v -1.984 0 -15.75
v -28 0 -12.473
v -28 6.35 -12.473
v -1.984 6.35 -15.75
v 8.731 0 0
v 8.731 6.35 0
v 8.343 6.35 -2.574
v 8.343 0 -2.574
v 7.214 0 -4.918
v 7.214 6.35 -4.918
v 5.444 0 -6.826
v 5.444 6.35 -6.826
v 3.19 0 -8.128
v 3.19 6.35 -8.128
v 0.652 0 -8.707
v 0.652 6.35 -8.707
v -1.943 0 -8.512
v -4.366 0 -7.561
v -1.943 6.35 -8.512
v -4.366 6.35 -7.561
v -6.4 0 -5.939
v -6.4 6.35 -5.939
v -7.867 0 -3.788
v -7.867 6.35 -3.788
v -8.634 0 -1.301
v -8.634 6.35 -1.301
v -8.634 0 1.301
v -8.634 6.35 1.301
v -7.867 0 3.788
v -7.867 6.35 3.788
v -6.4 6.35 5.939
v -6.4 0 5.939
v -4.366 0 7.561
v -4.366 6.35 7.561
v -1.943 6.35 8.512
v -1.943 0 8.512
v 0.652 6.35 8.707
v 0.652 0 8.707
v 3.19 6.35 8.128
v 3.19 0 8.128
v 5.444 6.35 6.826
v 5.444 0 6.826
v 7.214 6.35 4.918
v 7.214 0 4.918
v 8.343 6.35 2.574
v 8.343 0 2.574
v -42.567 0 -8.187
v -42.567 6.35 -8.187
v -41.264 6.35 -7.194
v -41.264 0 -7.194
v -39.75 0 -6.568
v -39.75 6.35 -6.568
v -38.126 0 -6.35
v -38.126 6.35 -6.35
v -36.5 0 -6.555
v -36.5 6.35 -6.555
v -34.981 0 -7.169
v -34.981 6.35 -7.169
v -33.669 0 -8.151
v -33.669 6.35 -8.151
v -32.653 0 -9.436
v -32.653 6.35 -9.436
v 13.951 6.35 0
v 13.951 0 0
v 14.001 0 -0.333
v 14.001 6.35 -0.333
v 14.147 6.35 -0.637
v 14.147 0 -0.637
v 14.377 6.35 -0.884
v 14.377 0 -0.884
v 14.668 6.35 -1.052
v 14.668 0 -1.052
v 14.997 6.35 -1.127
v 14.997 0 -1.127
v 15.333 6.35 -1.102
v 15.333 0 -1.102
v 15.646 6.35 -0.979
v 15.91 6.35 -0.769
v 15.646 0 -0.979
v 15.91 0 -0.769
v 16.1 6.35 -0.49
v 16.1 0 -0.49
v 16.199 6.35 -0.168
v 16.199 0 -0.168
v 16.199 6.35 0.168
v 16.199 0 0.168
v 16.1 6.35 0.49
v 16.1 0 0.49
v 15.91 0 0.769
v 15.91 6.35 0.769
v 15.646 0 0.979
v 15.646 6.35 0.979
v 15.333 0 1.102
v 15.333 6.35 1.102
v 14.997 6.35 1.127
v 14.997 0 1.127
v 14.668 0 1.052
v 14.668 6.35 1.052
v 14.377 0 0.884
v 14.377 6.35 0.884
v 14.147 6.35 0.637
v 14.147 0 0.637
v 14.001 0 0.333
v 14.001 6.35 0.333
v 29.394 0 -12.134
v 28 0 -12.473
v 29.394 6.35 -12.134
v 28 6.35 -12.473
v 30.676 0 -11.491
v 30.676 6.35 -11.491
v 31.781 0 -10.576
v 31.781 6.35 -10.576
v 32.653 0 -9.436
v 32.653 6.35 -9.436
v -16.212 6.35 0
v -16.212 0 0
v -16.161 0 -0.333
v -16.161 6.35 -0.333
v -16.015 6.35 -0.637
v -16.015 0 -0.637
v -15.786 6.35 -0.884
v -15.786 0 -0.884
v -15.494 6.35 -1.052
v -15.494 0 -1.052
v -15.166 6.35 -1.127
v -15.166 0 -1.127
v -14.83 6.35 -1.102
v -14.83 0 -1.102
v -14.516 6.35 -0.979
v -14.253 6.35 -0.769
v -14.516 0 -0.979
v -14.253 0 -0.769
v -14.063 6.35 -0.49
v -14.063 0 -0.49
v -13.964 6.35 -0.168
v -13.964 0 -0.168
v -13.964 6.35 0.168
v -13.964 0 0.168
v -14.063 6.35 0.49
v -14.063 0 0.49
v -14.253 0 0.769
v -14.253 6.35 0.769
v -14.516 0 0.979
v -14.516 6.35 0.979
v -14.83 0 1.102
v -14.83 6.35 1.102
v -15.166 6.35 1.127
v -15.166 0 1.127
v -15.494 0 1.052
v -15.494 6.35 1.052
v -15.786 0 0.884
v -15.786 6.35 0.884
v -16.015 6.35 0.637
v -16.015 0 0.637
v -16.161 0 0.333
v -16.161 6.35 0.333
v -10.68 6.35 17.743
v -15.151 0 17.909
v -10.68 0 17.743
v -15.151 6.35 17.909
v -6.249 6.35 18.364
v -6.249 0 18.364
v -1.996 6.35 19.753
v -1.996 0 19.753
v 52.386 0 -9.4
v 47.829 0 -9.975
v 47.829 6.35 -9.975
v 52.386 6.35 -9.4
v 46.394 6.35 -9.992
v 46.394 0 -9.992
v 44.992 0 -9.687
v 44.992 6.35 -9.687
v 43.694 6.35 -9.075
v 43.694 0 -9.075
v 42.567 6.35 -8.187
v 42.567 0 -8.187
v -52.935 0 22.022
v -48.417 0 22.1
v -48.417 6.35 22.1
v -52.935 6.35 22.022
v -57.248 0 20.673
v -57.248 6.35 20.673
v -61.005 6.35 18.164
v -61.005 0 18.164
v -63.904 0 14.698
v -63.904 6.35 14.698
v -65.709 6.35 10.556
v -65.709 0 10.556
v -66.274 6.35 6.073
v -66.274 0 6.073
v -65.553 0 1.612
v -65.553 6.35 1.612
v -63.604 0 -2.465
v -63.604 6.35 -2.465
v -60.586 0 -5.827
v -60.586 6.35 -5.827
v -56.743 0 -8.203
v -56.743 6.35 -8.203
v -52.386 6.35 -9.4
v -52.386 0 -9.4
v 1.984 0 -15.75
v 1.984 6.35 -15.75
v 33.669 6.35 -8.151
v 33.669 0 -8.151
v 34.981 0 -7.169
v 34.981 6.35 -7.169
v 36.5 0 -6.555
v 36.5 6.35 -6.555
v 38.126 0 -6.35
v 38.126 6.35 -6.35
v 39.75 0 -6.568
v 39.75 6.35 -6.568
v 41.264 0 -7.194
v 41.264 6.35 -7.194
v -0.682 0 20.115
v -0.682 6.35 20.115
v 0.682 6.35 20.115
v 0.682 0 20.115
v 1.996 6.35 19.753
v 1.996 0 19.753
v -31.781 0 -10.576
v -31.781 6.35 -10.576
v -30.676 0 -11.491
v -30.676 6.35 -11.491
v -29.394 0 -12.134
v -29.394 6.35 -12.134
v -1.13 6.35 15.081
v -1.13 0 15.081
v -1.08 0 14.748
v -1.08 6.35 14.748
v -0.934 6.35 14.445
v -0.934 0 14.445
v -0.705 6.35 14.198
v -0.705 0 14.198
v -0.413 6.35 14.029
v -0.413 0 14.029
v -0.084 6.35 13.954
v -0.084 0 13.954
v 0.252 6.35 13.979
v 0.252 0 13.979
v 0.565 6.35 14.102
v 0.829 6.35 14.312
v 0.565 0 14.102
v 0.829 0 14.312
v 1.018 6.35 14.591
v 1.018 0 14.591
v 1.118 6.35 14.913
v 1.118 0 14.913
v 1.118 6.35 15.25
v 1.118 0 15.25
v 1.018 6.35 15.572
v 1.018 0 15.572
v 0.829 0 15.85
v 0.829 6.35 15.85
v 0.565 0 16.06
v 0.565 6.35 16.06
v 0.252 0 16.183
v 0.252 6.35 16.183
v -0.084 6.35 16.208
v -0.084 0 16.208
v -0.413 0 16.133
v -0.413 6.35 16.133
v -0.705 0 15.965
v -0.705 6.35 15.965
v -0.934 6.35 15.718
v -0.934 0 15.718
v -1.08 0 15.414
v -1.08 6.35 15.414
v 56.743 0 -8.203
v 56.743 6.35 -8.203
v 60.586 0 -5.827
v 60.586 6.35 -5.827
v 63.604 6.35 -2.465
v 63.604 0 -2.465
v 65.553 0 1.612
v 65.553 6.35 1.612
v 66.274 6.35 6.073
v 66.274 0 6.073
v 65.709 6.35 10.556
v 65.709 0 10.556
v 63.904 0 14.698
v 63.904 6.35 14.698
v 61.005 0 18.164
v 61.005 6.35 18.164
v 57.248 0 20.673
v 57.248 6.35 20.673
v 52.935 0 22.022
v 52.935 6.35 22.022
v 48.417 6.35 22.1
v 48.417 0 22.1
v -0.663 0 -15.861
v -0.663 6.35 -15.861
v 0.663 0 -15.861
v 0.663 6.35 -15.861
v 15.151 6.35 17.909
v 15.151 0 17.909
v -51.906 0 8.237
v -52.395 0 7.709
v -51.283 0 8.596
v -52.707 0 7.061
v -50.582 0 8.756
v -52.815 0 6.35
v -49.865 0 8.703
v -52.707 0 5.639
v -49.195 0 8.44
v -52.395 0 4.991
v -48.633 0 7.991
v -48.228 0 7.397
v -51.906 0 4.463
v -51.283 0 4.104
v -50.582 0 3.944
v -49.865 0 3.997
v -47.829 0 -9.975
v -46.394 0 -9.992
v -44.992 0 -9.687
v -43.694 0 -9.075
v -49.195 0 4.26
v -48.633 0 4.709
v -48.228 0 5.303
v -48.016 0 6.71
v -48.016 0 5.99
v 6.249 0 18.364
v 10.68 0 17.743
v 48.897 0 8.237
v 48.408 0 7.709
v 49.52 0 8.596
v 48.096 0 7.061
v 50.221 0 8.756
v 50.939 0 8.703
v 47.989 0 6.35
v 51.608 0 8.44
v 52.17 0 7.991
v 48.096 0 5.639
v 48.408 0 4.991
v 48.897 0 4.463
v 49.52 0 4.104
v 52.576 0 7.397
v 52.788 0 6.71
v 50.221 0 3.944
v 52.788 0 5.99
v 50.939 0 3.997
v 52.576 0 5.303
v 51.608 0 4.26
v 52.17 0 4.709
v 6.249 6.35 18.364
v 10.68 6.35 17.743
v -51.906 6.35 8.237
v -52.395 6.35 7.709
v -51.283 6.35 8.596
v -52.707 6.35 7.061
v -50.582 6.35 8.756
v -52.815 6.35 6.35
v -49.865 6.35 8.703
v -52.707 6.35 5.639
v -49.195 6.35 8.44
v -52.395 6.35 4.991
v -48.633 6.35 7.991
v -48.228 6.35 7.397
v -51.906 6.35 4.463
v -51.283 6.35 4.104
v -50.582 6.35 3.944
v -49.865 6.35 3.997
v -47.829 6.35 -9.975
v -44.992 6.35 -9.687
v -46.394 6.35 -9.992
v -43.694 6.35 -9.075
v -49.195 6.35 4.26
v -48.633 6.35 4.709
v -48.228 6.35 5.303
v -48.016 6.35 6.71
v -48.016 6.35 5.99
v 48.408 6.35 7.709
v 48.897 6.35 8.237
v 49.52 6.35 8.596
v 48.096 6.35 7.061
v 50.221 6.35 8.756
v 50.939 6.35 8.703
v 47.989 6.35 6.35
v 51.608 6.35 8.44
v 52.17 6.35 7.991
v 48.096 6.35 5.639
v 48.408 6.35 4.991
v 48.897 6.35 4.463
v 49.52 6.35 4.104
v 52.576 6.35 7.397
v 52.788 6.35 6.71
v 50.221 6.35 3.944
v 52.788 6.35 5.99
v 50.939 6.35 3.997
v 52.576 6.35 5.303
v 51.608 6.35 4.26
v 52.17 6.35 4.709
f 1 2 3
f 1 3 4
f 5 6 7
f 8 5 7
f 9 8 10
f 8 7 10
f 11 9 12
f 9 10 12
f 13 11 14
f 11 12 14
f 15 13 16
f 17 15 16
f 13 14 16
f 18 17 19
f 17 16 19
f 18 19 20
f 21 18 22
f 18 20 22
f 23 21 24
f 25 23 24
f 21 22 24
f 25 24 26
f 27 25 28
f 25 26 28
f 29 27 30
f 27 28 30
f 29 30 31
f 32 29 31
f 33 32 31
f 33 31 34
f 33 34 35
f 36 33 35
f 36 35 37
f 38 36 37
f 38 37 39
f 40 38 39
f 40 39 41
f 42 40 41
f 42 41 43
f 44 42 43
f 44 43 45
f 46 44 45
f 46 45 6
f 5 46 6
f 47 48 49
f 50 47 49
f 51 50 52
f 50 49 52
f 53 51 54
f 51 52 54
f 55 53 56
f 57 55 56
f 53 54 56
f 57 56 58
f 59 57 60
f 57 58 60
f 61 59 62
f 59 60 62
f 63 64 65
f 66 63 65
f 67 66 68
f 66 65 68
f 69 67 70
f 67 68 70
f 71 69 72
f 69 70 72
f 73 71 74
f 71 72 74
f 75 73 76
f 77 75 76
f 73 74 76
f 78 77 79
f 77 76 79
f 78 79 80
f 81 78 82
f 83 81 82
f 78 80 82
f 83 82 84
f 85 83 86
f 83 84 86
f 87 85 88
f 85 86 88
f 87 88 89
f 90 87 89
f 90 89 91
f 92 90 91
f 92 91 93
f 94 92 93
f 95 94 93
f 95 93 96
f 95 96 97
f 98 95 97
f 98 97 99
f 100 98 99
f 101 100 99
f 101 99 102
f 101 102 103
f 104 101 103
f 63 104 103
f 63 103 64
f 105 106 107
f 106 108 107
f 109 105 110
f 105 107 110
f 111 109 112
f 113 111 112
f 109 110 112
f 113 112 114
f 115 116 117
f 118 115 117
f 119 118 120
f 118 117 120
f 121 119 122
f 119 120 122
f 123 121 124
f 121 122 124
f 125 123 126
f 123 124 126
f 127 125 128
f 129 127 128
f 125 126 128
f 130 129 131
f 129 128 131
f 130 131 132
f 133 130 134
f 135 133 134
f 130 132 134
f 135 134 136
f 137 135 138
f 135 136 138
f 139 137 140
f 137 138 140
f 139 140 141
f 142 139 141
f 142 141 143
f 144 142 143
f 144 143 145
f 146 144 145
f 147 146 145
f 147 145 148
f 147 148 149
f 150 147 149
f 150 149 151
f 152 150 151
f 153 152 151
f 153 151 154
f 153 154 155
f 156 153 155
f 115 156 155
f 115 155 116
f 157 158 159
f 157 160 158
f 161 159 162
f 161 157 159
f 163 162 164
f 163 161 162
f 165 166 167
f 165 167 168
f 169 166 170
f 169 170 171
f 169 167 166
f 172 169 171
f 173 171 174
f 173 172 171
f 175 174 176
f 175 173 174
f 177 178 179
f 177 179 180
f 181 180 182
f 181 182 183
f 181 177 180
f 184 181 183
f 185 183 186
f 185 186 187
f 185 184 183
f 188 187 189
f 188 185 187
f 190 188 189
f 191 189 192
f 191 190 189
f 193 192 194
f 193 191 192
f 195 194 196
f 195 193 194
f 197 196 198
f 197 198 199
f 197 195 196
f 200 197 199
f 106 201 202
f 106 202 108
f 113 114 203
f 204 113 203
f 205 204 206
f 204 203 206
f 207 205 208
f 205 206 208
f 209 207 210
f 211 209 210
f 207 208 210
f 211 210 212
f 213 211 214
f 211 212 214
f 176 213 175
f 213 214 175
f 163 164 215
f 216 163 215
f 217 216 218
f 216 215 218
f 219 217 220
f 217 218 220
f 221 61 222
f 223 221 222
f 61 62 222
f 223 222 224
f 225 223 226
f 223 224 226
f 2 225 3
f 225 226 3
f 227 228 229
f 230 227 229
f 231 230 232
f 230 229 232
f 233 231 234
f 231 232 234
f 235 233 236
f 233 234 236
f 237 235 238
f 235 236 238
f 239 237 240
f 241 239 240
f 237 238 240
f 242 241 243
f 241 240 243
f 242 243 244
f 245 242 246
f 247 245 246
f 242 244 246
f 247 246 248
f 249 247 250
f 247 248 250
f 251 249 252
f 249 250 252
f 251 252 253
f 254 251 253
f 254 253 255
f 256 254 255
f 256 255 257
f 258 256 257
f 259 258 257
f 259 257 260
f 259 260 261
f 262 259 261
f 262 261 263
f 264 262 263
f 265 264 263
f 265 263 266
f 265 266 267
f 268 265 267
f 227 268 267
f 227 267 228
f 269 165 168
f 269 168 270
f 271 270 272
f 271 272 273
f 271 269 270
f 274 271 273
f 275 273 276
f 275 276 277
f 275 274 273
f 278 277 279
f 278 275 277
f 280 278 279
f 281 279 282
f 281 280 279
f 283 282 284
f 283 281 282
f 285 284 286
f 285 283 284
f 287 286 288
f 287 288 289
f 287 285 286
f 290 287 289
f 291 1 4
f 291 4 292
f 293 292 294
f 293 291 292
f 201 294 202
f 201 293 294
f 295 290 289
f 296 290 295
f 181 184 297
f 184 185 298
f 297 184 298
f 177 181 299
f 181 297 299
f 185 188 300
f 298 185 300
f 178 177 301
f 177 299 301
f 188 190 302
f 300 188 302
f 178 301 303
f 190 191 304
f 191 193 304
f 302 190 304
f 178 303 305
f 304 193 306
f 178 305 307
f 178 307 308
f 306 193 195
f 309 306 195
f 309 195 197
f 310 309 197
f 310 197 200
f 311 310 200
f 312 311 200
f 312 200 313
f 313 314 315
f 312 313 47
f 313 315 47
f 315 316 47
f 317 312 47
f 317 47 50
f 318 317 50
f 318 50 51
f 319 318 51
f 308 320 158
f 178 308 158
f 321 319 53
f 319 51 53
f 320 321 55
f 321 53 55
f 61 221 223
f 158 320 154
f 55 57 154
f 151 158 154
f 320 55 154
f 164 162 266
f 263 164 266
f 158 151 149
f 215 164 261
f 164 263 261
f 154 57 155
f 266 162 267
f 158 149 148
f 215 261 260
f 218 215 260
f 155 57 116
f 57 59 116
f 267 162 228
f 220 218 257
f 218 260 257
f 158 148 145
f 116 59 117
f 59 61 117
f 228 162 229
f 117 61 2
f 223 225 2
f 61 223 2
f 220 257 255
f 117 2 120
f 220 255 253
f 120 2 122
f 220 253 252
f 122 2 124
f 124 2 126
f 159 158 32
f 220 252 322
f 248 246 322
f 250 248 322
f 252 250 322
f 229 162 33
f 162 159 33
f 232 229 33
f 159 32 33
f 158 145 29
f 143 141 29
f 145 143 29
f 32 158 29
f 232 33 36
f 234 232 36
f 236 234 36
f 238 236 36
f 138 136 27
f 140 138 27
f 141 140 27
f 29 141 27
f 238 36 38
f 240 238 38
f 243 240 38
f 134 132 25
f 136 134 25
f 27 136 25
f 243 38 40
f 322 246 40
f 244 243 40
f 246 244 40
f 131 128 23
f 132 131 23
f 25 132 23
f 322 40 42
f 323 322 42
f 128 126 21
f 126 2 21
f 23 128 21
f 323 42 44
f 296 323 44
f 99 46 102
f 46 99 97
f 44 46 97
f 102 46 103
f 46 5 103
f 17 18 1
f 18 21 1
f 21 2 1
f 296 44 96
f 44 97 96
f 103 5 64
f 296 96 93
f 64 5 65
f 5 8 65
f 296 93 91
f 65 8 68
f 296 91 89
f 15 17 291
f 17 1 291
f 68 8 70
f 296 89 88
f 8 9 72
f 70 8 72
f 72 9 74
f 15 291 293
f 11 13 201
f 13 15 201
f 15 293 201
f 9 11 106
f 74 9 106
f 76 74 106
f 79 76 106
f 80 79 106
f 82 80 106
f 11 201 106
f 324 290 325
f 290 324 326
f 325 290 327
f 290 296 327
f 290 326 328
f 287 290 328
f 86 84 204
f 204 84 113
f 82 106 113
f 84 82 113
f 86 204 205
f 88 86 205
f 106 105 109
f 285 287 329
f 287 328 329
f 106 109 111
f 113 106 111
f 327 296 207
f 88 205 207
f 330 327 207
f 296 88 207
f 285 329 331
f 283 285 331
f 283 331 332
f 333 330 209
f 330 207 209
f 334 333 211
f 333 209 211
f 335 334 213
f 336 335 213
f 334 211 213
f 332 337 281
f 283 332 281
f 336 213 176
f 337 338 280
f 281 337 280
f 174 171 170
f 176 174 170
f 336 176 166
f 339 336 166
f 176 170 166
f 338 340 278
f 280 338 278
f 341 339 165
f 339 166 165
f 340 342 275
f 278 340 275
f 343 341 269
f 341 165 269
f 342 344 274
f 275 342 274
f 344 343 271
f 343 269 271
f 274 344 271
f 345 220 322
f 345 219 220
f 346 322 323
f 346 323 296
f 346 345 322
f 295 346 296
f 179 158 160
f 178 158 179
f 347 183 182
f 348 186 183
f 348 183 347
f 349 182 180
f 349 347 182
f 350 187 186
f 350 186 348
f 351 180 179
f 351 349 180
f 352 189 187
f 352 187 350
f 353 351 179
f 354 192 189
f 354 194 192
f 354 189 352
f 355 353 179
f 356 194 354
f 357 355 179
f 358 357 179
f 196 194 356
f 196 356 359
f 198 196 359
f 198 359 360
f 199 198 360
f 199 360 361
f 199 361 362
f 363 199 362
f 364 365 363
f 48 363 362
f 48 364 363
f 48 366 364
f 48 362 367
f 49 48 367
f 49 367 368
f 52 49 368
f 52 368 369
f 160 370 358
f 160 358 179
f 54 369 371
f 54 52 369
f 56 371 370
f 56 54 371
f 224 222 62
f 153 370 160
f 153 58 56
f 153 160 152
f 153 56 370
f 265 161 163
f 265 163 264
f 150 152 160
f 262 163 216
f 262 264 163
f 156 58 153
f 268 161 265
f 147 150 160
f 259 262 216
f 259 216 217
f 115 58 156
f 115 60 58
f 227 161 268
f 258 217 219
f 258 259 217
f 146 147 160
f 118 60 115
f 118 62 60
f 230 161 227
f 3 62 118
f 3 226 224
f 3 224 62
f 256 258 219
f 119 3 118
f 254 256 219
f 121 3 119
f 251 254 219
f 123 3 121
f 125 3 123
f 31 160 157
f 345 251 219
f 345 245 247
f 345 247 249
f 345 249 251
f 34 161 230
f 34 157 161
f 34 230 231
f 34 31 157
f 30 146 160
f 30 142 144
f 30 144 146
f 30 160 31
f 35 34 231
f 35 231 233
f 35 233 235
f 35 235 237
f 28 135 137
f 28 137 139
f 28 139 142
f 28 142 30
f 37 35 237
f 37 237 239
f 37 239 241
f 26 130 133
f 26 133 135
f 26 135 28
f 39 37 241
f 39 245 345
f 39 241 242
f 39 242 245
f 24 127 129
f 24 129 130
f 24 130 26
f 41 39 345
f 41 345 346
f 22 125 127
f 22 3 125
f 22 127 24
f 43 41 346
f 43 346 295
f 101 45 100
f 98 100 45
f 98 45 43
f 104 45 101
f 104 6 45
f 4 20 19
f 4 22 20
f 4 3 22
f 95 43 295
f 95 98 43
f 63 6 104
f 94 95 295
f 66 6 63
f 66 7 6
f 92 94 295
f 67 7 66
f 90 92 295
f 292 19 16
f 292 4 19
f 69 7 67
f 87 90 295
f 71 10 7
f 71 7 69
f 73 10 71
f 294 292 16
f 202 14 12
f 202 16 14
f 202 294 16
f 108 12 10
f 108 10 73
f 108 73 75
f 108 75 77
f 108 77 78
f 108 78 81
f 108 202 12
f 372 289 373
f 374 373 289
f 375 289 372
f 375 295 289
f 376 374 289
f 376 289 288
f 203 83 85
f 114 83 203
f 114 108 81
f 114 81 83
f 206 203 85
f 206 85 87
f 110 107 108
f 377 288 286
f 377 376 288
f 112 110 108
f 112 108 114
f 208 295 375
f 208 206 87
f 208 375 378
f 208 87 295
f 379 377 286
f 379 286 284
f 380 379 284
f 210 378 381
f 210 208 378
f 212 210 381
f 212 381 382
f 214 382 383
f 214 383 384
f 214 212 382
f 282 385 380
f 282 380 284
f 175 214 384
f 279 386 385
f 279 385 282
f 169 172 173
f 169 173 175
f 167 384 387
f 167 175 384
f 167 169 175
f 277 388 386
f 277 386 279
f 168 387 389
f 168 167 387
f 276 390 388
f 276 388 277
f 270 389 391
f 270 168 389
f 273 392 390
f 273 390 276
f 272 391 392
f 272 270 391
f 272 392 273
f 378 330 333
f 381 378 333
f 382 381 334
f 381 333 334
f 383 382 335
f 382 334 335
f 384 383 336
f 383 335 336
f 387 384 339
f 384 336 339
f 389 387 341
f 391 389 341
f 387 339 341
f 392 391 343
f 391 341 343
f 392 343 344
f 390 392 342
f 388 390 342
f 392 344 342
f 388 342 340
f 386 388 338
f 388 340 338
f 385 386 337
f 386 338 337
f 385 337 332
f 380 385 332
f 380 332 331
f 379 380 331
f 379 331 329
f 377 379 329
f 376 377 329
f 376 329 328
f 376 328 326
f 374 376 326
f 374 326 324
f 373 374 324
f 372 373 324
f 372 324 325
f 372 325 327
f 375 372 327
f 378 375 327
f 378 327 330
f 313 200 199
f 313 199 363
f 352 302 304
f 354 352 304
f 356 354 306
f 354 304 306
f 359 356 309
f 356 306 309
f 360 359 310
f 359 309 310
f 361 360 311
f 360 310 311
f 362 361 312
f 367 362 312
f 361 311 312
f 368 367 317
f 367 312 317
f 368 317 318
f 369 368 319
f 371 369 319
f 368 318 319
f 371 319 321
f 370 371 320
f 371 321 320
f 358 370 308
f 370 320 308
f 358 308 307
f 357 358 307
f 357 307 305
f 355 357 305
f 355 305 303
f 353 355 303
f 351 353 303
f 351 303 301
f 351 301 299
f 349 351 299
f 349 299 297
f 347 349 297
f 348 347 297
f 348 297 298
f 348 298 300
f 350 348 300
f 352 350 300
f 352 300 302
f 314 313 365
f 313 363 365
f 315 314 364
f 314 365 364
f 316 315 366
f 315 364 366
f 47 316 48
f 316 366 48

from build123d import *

# Parameters (mm, degrees)
SKETCH1_R              = 5.08
BOSS_EXTRUDE1_DEPTH    = 6.35
F_10_32_TAPPED_HOLE1_D = 4.826
SKETCH7_R              = 8.73125
CUT_EXTRUDE1_DEPTH     = 7.35
SKETCH8_R              = 6.35
CUT_EXTRUDE2_DEPTH     = 7.35
FILLET1_R              = 25.4
FILLET2_R              = 6.35
F_4_40_TAPPED_HOLE1_D  = 2.2606


with BuildPart() as part:
    # Sketch1 → Boss-Extrude1 (new body)
    with BuildSketch(Plane(origin=(0, 0, 0), x_dir=(1, 0, 0), z_dir=(0, 1, 0))):
        with Locations((0, -15.08125)):
            Circle(SKETCH1_R)
        with BuildLine():
            Line((1.984375, -15.750488274), (-48.417187476, -22.100488274))
            ThreePointArc((-48.417187476, -22.100488274), (-66.152050749, -8.334375), (-52.385937476, 9.400488274))
            Line((-52.385937476, 9.400488274), (-1.984375, 15.750488274))
            ThreePointArc((-1.984375, 15.750488274), (15.750488274, 1.984375), (1.984375, -15.750488274))
        make_face()
        with BuildLine():
            Line((1.984375, 15.750488274), (52.385937476, 9.400488274))
            ThreePointArc((52.385937476, 9.400488274), (66.152050749, -8.334375), (48.417187476, -22.100488274))
            Line((48.417187476, -22.100488274), (-1.984375, -15.750488274))
            ThreePointArc((-1.984375, -15.750488274), (-15.750488274, 1.984375), (1.984375, 15.750488274))
        make_face()
    extrude(amount=BOSS_EXTRUDE1_DEPTH)

    # #10-32 Tapped Hole1 (through all)
    with Locations(Plane(origin=(0, 6.35, 0), x_dir=(1, 0, 0), z_dir=(0, 1, 0))):
        with Locations((-50.401562476, -6.35), (50.401562476, -6.35)):
            Hole(F_10_32_TAPPED_HOLE1_D / 2)

    # Sketch7 → Cut-Extrude1 (cut, through all)
    with BuildSketch(Plane(origin=(0, 6.35, 0), x_dir=(1, 0, 0), z_dir=(0, 1, 0))):
        Circle(SKETCH7_R)
    extrude(amount=-CUT_EXTRUDE1_DEPTH, mode=Mode.SUBTRACT)

    # Sketch8 → Cut-Extrude2 (cut, through all)
    with BuildSketch(Plane(origin=(0, 6.35, 0), x_dir=(1, 0, 0), z_dir=(0, 1, 0))):
        with Locations((-38.1, 12.7)):
            Circle(SKETCH8_R)
        with Locations((38.1, 12.7)):
            Circle(SKETCH8_R)
    extrude(amount=-CUT_EXTRUDE2_DEPTH, mode=Mode.SUBTRACT)

    # Fillet1
    fillet1_edges = [part.edges().sort_by_distance(p)[0] for p in [
        (-4.844257487, 3.175, 16.6108151),
        (4.844257487, 3.175, 16.6108151),
    ]]
    fillet(fillet1_edges, radius=FILLET1_R)

    # Fillet2
    fillet2_edges = [part.edges().sort_by_distance(p)[0] for p in [
        (-31.789208912, 3.175, -11.995432159),
        (-44.038818433, 3.175, -10.452126424),
        (31.789208912, 3.175, -11.995432159),
        (44.038818433, 3.175, -10.452126424),
    ]]
    fillet(fillet2_edges, radius=FILLET2_R)

    # #4-40 Tapped Hole1 (through all)
    with Locations(Plane(origin=(0, 6.35, 0), x_dir=(1, 0, 0), z_dir=(0, 1, 0))):
        with Locations((-15.08125, 0), (15.08125, 0), (0, -15.08125)):
            Hole(F_4_40_TAPPED_HOLE1_D / 2)


solid = part.part
